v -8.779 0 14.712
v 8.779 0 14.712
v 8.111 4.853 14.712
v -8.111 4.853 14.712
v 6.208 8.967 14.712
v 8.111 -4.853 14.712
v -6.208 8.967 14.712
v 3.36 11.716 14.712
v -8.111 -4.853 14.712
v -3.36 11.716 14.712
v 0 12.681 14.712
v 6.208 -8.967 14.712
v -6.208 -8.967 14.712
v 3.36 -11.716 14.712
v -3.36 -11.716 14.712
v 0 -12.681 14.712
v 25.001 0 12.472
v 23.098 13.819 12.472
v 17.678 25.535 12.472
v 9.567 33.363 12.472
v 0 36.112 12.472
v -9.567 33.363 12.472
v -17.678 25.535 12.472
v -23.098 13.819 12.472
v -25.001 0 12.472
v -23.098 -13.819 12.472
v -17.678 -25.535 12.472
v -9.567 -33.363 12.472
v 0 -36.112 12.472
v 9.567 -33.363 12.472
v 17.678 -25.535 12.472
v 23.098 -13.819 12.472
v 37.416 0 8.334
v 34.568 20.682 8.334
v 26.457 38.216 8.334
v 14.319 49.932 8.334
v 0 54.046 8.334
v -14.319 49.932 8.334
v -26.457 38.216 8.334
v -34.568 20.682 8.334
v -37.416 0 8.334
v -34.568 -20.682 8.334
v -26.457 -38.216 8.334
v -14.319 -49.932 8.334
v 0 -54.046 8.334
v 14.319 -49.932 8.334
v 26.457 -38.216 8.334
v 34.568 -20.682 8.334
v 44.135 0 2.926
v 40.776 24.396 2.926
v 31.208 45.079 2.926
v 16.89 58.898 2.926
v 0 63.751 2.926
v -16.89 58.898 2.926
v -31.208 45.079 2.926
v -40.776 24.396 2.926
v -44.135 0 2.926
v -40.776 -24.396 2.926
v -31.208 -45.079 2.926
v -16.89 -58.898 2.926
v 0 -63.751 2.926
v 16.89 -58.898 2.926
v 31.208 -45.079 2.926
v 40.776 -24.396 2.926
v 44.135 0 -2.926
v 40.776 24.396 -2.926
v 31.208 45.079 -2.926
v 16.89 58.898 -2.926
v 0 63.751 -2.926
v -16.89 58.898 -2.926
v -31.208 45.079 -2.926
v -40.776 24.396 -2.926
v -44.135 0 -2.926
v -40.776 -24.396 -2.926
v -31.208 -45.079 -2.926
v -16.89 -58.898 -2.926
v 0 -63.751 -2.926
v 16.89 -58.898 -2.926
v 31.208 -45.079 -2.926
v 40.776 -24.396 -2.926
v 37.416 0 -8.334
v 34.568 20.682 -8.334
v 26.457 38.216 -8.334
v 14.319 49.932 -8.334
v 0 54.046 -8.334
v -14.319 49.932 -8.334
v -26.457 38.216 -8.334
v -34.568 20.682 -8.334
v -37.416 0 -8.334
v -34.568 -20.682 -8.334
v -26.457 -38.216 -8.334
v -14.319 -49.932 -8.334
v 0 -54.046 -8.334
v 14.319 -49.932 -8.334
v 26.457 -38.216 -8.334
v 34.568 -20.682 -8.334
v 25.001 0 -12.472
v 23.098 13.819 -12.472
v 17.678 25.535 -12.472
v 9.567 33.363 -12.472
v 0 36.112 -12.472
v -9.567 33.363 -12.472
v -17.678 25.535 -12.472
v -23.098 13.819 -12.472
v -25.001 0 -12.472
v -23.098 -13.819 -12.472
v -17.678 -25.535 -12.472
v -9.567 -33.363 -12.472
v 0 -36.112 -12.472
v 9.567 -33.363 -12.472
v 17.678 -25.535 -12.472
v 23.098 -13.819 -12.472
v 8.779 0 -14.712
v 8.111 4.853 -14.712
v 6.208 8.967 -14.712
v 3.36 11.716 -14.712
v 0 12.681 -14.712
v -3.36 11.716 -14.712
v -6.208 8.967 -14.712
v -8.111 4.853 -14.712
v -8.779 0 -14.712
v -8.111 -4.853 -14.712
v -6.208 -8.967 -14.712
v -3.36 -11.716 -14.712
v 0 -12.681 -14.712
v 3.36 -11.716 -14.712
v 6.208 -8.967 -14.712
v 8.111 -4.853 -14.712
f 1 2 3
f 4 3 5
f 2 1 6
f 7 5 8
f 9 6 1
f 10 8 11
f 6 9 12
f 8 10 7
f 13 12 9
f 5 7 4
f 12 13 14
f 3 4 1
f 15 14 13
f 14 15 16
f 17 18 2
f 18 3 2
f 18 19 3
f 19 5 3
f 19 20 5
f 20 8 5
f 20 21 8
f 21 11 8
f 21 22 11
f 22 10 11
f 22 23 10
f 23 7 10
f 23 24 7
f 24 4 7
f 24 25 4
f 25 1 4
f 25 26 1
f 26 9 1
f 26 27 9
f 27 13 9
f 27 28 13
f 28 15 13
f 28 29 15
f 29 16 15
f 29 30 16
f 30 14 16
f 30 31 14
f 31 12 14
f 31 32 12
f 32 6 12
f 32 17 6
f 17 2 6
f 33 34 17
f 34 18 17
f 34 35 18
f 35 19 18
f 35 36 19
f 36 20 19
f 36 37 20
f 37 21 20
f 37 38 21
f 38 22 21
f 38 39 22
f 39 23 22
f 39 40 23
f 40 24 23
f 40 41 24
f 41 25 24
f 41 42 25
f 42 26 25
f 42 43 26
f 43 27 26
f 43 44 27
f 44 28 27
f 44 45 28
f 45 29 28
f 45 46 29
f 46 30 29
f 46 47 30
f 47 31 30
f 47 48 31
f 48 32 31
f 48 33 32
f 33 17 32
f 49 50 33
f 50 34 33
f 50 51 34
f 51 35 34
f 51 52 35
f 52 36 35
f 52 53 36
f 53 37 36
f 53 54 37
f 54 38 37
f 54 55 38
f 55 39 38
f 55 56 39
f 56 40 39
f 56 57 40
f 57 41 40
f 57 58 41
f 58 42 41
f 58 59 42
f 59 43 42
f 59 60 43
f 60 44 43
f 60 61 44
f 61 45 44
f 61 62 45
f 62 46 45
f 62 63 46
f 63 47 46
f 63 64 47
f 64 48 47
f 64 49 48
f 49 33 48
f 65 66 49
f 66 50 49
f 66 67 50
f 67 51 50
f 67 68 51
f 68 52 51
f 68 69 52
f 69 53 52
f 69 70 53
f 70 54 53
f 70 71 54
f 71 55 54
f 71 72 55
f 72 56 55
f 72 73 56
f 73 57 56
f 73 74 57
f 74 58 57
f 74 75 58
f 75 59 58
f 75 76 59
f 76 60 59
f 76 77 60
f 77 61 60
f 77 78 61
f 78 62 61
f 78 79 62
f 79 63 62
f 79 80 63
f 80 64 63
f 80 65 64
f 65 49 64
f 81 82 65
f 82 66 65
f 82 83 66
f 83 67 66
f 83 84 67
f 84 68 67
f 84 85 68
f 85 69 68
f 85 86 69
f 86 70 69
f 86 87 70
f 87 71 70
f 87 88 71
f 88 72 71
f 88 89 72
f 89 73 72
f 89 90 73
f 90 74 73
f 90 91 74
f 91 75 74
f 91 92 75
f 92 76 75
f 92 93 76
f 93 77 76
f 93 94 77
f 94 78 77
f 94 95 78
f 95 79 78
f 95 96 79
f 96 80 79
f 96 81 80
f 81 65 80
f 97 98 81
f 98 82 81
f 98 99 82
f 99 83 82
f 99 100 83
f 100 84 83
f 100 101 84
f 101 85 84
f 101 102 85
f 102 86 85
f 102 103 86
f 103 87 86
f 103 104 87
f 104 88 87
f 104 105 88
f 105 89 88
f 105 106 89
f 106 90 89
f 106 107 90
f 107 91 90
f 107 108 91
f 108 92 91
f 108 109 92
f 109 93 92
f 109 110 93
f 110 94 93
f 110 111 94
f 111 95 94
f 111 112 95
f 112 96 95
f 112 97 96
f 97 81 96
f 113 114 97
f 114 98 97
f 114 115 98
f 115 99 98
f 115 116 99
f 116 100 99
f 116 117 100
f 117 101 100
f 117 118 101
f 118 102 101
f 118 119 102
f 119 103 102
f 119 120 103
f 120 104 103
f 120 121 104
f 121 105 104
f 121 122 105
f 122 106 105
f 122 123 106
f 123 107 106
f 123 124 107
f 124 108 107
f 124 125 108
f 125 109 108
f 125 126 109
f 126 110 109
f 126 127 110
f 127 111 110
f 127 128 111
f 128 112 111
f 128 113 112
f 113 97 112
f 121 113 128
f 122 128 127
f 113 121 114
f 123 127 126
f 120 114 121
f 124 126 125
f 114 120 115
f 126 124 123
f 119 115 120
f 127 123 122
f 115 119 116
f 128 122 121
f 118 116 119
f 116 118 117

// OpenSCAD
// Generated by SolidPython 1.0.1 on 2020-07-29 00:46:48


scale(v = [9, 13, 3]) {
	sphere(r = 5);
}
/***********************************************
*********      SolidPython code:      **********
************************************************
 
# import packages: SolidPython
from solid import *
from solid.utils import *
from itertools import chain, combinations, permutations


class Resize:

    def __init__(self, scad_file):
        self.scad_file = scad_file
        #self.scad_file = import_scad(scad_file)
        # cone/cylinder param:
        self.r1 = 0
        self.r2 = 0
        self.h = 0
        # rectangular prism param:
        self.w = 0
        self.l = 0
        # ellipse param:
        self.r = 0

    # import OpenScad code (file name corresponds to shape)


    # classify shape + parameters
    def assign(self, param1, param2, param3):
        if self.scad_file == 'cone.scad':
            self.r1 = param1
            self.r2 = param2
            self.h = param3
        elif self.scad_file == 'cylinder.scad':
            self.r1 = param1
            self.r2 = param2
            self.h = param3
        elif self.scad_file == 'rectangularPrism.scad':
            self.h = param1
            self.l = param2
            self.w = param3
        else:
            self.r = param1
            self.h = param2

    # resize parameters
    def iterate(self):
        x = range(3, 20, 2)
        i = 1
        if self.scad_file == 'cone.scad':
            tempList = list(permutations(x, 2))
            for temp in tempList:
                param1 = temp[0]
                param2 = temp[1]
                filepath = 'produced_scad_files/' + 'cone' + str(param1) + '_' + str(param2) + '_' + '.scad'
                scad_render_to_file(cylinder(h=param1, r1=param2, r2=0), filepath)

        elif self.scad_file == 'cylinder.scad':
            tempList = list(permutations(x, 3))
            for temp in tempList:
                param1 = temp[0]
                param2 = temp[1]
                filepath = 'produced_scad_files/' + 'cylinder' + str(param1) + '_' + str(param2) + '_' + '.scad'
                scad_render_to_file(cylinder(h=param1, r1=param2, r2=param2), filepath)

        elif self.scad_file == 'rectangularPrism.scad':
            tempList = list(permutations(x, 3))
            for temp in tempList:
                param1 = temp[0]
                param2 = temp[1]
                param3 = temp[2]
                filepath = 'produced_scad_files/' + 'rectangularPrism' + str(param1) + '_' + str(param2) + '_' + str(
                    param3) + '.scad'
                scad_render_to_file(cube(size=(param1, param2, param3)), filepath)

        elif self.scad_file == 'ellipse.scad':
            tempList = list(permutations(x, 4))
            for temp in tempList:
                param1 = temp[0]
                param2 = temp[1]
                param3 = temp[2]
                param4 = temp[3]
                filepath = 'produced_scad_files/' + 'ellipse' + str(param1) + '_' + str(param2) + '_' + str(param3) + '_' + str(param4) + '.scad'
                scad_render_to_file(scale([param1, param2, param3])(sphere(r=param4)), filepath)

    def render_to_scadfile(self):
        scad_render_to_file(scad, 'example.scad') 
 
************************************************/
